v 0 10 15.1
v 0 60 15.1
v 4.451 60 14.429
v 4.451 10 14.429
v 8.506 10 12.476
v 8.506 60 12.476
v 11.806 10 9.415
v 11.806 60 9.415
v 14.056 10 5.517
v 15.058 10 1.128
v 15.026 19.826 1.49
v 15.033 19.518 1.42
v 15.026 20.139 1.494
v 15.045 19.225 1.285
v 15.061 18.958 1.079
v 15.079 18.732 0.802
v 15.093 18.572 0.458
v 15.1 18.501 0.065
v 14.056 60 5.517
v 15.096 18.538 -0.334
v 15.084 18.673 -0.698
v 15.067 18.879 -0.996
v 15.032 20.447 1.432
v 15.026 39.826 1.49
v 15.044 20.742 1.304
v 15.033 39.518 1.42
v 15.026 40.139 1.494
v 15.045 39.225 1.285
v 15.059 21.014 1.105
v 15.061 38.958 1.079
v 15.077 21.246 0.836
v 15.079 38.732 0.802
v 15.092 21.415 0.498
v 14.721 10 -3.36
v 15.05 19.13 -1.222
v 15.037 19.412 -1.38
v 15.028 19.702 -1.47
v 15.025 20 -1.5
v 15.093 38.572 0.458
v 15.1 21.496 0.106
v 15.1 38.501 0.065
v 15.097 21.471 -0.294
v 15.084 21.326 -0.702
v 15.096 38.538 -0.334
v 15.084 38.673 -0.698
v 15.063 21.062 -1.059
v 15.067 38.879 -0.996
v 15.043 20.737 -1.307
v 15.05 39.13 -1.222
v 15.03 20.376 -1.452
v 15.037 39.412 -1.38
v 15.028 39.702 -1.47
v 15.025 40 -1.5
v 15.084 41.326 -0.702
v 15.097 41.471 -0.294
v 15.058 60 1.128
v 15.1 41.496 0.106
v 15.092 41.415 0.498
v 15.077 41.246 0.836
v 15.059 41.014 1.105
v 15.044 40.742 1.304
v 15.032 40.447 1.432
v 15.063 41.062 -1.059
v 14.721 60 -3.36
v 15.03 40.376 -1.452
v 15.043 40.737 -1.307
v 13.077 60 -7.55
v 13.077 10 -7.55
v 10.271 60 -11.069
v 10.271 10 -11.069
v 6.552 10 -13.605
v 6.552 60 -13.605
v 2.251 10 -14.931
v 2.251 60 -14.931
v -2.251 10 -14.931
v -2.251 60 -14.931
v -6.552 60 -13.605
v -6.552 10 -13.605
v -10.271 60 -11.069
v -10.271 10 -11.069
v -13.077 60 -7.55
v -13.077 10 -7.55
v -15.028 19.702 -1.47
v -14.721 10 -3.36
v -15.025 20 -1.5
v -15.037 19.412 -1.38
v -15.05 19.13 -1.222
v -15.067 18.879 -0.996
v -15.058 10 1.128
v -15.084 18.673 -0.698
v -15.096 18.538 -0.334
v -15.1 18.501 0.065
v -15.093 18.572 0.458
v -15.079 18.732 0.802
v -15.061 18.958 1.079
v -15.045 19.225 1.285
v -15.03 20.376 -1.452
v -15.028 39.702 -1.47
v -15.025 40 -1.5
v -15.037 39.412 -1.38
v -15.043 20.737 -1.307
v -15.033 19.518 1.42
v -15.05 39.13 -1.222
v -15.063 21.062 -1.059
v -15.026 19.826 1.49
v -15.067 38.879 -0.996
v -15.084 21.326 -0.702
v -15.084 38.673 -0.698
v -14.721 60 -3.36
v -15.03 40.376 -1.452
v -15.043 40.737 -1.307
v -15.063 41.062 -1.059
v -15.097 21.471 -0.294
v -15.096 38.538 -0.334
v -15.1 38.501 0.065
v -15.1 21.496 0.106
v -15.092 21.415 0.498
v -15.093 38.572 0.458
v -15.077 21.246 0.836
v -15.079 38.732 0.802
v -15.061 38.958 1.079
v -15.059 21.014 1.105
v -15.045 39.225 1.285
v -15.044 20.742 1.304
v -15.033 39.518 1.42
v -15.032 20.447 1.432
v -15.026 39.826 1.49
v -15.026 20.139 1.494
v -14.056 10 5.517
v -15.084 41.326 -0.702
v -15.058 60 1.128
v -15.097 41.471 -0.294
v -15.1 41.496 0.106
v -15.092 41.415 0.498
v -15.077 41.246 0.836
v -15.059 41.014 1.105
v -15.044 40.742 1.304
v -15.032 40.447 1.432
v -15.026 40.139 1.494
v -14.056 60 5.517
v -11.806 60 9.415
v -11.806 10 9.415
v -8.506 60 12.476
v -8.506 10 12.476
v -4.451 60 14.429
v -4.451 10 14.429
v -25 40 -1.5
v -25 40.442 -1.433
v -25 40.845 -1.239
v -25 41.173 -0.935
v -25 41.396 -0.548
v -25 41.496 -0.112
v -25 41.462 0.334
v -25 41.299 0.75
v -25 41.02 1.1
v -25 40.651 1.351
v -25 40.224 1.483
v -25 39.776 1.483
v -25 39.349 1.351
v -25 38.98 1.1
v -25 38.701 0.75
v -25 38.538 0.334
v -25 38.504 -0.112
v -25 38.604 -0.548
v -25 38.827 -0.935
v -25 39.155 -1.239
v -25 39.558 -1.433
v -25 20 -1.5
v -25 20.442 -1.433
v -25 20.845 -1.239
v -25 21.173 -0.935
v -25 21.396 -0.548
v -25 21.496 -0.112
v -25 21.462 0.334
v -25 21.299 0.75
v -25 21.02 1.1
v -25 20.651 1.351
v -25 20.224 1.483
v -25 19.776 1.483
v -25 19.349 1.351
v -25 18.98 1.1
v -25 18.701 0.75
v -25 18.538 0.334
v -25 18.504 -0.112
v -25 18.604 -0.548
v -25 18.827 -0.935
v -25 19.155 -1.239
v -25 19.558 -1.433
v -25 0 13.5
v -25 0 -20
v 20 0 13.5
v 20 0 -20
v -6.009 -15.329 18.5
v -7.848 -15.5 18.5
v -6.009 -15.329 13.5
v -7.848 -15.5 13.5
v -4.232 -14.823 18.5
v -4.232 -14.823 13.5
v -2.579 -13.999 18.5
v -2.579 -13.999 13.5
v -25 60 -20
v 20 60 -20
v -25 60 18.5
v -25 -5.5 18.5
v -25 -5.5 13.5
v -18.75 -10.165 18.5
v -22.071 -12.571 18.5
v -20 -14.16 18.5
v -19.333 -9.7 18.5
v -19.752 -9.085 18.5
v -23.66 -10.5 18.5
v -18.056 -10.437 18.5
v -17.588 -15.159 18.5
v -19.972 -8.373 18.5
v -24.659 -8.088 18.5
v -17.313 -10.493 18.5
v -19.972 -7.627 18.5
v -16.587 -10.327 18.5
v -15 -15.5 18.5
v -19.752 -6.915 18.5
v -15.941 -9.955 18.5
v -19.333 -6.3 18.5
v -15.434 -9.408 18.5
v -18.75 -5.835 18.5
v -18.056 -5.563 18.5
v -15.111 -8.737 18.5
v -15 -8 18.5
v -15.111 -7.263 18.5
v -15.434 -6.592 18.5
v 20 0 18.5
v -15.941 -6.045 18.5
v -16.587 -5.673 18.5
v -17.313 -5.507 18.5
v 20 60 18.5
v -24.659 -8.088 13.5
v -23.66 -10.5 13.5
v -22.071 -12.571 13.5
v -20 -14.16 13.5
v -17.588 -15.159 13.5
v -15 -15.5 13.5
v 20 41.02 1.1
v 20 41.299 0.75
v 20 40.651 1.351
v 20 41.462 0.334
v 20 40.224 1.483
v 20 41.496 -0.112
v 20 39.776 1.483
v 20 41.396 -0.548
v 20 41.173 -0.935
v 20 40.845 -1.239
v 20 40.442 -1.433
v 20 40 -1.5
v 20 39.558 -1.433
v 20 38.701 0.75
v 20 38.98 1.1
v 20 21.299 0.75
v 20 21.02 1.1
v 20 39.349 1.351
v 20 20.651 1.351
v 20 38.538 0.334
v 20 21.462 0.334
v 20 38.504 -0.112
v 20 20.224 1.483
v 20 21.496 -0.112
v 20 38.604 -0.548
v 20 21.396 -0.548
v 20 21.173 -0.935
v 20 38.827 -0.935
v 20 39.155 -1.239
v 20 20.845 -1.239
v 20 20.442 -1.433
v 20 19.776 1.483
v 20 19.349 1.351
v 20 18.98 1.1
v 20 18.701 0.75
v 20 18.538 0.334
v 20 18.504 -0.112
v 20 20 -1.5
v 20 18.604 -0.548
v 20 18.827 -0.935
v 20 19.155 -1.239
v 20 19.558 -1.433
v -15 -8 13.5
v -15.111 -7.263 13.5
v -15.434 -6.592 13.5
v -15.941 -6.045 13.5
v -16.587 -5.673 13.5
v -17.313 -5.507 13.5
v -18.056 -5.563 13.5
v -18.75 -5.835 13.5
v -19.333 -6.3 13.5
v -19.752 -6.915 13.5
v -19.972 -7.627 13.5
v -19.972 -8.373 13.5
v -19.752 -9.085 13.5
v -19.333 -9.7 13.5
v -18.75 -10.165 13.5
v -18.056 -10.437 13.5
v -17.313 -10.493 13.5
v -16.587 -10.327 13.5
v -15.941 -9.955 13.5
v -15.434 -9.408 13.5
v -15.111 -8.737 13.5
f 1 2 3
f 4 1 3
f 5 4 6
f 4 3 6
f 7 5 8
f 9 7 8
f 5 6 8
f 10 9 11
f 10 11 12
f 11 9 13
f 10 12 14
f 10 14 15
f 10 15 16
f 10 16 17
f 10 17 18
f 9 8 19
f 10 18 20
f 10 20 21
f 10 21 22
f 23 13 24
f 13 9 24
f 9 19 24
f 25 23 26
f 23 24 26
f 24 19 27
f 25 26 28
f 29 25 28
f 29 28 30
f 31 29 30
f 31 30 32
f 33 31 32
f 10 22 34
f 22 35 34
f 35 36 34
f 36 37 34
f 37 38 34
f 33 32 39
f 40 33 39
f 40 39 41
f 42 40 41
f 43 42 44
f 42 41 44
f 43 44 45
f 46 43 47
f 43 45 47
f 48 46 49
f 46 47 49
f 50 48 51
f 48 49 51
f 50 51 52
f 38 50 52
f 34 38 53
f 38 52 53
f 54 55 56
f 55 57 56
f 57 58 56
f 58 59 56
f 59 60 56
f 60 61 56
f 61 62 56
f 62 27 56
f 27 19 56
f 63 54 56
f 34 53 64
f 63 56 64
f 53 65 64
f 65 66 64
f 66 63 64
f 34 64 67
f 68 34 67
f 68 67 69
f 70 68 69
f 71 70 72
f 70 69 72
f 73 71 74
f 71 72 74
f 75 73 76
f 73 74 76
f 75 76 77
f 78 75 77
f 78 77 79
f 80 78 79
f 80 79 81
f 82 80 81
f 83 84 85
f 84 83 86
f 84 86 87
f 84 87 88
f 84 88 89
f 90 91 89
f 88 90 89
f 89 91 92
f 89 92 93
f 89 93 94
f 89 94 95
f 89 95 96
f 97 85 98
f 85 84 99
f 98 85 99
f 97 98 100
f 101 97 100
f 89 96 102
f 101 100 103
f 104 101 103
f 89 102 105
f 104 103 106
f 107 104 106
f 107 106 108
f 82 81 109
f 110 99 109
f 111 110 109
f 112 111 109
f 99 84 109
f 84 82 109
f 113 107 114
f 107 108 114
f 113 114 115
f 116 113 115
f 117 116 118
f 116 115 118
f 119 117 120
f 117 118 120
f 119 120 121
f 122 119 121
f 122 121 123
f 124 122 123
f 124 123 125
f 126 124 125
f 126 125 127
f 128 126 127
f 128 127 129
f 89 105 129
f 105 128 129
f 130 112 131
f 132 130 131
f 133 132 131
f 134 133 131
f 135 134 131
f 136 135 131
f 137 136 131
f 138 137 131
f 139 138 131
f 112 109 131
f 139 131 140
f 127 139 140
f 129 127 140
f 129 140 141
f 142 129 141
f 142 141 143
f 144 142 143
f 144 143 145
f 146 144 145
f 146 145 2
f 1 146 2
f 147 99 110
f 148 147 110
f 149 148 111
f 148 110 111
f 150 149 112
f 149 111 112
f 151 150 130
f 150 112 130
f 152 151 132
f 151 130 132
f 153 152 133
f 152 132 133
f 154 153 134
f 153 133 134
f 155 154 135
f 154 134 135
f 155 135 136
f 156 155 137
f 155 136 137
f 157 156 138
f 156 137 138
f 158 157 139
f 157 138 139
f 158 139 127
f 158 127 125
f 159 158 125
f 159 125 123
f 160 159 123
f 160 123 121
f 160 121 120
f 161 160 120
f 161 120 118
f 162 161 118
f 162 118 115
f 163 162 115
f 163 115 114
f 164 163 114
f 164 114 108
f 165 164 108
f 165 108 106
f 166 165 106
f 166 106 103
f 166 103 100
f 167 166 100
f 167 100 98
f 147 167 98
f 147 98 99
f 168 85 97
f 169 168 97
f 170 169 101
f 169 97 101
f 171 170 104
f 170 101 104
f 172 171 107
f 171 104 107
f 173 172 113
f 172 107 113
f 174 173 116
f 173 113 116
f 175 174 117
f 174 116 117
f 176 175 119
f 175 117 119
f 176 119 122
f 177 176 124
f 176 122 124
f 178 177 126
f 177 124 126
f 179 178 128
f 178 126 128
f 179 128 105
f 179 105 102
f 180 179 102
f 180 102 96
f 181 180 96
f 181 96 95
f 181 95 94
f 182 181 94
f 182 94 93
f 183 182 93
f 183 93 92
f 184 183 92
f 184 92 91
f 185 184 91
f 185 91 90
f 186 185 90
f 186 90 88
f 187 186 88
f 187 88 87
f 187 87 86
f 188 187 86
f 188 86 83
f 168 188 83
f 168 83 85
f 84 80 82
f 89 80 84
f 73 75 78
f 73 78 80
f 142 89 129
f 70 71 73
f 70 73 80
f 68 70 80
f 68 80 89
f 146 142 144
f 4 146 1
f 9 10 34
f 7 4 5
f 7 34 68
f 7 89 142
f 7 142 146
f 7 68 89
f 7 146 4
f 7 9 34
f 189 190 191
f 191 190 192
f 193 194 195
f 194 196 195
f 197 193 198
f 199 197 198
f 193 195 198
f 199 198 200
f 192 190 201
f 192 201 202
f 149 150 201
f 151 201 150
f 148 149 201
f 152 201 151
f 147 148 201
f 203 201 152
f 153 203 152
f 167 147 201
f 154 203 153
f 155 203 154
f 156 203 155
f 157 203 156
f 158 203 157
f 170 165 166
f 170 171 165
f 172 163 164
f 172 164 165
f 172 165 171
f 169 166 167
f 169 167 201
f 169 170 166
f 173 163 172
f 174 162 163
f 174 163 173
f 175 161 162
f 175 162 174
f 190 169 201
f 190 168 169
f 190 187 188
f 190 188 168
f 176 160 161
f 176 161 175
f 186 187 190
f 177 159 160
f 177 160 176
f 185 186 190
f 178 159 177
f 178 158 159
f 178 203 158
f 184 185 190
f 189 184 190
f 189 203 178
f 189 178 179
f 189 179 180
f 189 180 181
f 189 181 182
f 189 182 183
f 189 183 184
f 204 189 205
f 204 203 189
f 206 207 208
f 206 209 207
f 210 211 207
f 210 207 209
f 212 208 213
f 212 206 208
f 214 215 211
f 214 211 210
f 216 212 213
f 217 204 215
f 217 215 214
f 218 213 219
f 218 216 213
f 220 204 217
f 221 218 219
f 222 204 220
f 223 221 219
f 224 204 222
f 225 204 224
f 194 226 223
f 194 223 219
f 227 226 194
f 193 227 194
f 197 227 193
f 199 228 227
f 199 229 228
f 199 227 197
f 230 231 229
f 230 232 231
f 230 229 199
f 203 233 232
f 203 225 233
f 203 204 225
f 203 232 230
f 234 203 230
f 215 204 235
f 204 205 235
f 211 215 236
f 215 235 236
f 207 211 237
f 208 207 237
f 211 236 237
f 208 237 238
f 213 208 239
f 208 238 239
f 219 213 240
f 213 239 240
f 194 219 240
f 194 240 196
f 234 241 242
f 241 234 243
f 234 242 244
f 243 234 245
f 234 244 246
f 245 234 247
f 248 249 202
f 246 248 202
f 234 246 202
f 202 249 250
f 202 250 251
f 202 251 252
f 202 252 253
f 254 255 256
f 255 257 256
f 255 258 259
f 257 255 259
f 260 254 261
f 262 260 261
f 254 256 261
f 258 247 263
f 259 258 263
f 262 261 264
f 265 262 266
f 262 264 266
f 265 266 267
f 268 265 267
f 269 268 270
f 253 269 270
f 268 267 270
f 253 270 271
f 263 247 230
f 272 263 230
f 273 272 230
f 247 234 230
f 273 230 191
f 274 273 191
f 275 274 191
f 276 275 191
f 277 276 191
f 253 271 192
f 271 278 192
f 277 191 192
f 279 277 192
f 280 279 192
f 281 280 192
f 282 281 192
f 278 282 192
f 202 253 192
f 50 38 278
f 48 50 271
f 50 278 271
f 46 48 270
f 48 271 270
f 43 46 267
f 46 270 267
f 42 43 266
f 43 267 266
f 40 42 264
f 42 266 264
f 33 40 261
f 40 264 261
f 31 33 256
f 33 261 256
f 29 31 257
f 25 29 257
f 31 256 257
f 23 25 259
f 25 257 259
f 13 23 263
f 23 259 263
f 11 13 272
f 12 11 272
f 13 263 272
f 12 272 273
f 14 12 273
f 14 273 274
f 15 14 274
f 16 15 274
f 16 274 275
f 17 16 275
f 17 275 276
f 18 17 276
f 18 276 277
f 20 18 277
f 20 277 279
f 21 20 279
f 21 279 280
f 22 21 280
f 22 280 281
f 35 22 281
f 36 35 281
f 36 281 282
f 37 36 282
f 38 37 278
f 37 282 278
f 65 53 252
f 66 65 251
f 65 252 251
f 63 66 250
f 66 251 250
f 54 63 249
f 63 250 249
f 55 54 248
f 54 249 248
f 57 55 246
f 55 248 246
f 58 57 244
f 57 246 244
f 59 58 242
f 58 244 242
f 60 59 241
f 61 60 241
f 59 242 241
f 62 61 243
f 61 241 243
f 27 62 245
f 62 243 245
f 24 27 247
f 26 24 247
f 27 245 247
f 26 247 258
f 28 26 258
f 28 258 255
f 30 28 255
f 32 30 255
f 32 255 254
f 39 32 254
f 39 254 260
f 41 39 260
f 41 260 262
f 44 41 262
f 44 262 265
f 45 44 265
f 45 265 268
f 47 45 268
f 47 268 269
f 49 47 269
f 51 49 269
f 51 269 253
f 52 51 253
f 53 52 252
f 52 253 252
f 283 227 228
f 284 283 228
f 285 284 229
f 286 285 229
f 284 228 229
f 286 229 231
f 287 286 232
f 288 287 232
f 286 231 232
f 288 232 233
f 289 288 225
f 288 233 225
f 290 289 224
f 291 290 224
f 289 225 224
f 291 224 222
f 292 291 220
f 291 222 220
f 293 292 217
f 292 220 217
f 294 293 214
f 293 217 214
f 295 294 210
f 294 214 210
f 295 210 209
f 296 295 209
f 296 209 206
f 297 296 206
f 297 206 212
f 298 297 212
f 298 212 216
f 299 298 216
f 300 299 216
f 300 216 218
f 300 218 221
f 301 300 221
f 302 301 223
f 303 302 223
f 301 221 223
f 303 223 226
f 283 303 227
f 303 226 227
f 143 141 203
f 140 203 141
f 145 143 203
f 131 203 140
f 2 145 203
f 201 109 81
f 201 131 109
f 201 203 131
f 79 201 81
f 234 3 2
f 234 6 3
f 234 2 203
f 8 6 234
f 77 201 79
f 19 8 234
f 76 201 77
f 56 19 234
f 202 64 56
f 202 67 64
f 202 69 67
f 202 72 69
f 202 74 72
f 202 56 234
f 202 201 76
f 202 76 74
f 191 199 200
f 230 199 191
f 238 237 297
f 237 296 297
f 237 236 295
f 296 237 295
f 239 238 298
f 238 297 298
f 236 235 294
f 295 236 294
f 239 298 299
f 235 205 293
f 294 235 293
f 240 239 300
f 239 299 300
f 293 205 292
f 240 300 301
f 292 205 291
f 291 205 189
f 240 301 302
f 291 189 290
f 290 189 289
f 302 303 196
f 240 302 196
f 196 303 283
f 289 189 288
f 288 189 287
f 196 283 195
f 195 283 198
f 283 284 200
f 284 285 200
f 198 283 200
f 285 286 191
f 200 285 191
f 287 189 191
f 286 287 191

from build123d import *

# Parameters (mm, degrees)
SKETCH_1_W             = 45
SKETCH_1_H             = 38.5
EXTRUDE_1_DEPTH        = 60
SKETCH_2_R             = 15.1
CUT_EXTRUDE_1_DEPTH    = 50
SKETCH_3_R             = 2.5
EXTRUDE_2_DEPTH        = 5
SKETCH_4_R             = 1.5
CUT_EXTRUDE_2_DEPTH    = 78.620873481
PATTERN_LINEAR_1_COUNT = 2
PATTERN_LINEAR_1_PITCH = 20
FILLET_1_R             = 10


with BuildPart() as part:
    # 草圖1 → 填料-伸長1 (new body)
    with BuildSketch(Plane(origin=(0, 0, 0), x_dir=(1, 0, 0), z_dir=(0, 1, 0))):
        with Locations((-2.5, 0.75)):
            Rectangle(SKETCH_1_W, SKETCH_1_H)
    extrude(amount=EXTRUDE_1_DEPTH)

    # 草圖2 → 除料-伸長1 (cut)
    with BuildSketch(Plane(origin=(0, 60, 0), x_dir=(1, 0, 0), z_dir=(0, 1, 0))):
        with Locations(Location((0, 0, 0), (0, 0, 270))):
            Circle(SKETCH_2_R)
    extrude(amount=-CUT_EXTRUDE_1_DEPTH, mode=Mode.SUBTRACT)

    # 草圖3 → 填料-伸長2 (add)
    with BuildSketch(Plane.XY.offset(18.5)):
        Polygon((-25, 0), (-25, -15.5), (-5, -15.5), (20, 0), align=None)
        with Locations((-17.5, -8)):
            Circle(SKETCH_3_R, mode=Mode.SUBTRACT)
    extrude(amount=-EXTRUDE_2_DEPTH)

    # 草圖4 → 除料-伸長2 (cut, through all)
    with BuildSketch(Plane(origin=(20, 0, 0), x_dir=(0, 0, -1), z_dir=(1, 0, 0))):
        with Locations((0, 20)):
            Circle(SKETCH_4_R)
    cut_extrude_2 = extrude(amount=-CUT_EXTRUDE_2_DEPTH, mode=Mode.SUBTRACT)

    # 直線複製排列1: 除料-伸長2 ×2
    with Locations(*[(0, i * PATTERN_LINEAR_1_PITCH, 0) for i in range(1, PATTERN_LINEAR_1_COUNT)]):
        add(cut_extrude_2, mode=Mode.SUBTRACT)

    # 圓角1
    fillet_1_edges = [part.edges().sort_by_distance(p)[0] for p in [
        (-5, -15.5, 16),
        (-25, -15.5, 16),
    ]]
    fillet(fillet_1_edges, radius=FILLET_1_R)


solid = part.part
